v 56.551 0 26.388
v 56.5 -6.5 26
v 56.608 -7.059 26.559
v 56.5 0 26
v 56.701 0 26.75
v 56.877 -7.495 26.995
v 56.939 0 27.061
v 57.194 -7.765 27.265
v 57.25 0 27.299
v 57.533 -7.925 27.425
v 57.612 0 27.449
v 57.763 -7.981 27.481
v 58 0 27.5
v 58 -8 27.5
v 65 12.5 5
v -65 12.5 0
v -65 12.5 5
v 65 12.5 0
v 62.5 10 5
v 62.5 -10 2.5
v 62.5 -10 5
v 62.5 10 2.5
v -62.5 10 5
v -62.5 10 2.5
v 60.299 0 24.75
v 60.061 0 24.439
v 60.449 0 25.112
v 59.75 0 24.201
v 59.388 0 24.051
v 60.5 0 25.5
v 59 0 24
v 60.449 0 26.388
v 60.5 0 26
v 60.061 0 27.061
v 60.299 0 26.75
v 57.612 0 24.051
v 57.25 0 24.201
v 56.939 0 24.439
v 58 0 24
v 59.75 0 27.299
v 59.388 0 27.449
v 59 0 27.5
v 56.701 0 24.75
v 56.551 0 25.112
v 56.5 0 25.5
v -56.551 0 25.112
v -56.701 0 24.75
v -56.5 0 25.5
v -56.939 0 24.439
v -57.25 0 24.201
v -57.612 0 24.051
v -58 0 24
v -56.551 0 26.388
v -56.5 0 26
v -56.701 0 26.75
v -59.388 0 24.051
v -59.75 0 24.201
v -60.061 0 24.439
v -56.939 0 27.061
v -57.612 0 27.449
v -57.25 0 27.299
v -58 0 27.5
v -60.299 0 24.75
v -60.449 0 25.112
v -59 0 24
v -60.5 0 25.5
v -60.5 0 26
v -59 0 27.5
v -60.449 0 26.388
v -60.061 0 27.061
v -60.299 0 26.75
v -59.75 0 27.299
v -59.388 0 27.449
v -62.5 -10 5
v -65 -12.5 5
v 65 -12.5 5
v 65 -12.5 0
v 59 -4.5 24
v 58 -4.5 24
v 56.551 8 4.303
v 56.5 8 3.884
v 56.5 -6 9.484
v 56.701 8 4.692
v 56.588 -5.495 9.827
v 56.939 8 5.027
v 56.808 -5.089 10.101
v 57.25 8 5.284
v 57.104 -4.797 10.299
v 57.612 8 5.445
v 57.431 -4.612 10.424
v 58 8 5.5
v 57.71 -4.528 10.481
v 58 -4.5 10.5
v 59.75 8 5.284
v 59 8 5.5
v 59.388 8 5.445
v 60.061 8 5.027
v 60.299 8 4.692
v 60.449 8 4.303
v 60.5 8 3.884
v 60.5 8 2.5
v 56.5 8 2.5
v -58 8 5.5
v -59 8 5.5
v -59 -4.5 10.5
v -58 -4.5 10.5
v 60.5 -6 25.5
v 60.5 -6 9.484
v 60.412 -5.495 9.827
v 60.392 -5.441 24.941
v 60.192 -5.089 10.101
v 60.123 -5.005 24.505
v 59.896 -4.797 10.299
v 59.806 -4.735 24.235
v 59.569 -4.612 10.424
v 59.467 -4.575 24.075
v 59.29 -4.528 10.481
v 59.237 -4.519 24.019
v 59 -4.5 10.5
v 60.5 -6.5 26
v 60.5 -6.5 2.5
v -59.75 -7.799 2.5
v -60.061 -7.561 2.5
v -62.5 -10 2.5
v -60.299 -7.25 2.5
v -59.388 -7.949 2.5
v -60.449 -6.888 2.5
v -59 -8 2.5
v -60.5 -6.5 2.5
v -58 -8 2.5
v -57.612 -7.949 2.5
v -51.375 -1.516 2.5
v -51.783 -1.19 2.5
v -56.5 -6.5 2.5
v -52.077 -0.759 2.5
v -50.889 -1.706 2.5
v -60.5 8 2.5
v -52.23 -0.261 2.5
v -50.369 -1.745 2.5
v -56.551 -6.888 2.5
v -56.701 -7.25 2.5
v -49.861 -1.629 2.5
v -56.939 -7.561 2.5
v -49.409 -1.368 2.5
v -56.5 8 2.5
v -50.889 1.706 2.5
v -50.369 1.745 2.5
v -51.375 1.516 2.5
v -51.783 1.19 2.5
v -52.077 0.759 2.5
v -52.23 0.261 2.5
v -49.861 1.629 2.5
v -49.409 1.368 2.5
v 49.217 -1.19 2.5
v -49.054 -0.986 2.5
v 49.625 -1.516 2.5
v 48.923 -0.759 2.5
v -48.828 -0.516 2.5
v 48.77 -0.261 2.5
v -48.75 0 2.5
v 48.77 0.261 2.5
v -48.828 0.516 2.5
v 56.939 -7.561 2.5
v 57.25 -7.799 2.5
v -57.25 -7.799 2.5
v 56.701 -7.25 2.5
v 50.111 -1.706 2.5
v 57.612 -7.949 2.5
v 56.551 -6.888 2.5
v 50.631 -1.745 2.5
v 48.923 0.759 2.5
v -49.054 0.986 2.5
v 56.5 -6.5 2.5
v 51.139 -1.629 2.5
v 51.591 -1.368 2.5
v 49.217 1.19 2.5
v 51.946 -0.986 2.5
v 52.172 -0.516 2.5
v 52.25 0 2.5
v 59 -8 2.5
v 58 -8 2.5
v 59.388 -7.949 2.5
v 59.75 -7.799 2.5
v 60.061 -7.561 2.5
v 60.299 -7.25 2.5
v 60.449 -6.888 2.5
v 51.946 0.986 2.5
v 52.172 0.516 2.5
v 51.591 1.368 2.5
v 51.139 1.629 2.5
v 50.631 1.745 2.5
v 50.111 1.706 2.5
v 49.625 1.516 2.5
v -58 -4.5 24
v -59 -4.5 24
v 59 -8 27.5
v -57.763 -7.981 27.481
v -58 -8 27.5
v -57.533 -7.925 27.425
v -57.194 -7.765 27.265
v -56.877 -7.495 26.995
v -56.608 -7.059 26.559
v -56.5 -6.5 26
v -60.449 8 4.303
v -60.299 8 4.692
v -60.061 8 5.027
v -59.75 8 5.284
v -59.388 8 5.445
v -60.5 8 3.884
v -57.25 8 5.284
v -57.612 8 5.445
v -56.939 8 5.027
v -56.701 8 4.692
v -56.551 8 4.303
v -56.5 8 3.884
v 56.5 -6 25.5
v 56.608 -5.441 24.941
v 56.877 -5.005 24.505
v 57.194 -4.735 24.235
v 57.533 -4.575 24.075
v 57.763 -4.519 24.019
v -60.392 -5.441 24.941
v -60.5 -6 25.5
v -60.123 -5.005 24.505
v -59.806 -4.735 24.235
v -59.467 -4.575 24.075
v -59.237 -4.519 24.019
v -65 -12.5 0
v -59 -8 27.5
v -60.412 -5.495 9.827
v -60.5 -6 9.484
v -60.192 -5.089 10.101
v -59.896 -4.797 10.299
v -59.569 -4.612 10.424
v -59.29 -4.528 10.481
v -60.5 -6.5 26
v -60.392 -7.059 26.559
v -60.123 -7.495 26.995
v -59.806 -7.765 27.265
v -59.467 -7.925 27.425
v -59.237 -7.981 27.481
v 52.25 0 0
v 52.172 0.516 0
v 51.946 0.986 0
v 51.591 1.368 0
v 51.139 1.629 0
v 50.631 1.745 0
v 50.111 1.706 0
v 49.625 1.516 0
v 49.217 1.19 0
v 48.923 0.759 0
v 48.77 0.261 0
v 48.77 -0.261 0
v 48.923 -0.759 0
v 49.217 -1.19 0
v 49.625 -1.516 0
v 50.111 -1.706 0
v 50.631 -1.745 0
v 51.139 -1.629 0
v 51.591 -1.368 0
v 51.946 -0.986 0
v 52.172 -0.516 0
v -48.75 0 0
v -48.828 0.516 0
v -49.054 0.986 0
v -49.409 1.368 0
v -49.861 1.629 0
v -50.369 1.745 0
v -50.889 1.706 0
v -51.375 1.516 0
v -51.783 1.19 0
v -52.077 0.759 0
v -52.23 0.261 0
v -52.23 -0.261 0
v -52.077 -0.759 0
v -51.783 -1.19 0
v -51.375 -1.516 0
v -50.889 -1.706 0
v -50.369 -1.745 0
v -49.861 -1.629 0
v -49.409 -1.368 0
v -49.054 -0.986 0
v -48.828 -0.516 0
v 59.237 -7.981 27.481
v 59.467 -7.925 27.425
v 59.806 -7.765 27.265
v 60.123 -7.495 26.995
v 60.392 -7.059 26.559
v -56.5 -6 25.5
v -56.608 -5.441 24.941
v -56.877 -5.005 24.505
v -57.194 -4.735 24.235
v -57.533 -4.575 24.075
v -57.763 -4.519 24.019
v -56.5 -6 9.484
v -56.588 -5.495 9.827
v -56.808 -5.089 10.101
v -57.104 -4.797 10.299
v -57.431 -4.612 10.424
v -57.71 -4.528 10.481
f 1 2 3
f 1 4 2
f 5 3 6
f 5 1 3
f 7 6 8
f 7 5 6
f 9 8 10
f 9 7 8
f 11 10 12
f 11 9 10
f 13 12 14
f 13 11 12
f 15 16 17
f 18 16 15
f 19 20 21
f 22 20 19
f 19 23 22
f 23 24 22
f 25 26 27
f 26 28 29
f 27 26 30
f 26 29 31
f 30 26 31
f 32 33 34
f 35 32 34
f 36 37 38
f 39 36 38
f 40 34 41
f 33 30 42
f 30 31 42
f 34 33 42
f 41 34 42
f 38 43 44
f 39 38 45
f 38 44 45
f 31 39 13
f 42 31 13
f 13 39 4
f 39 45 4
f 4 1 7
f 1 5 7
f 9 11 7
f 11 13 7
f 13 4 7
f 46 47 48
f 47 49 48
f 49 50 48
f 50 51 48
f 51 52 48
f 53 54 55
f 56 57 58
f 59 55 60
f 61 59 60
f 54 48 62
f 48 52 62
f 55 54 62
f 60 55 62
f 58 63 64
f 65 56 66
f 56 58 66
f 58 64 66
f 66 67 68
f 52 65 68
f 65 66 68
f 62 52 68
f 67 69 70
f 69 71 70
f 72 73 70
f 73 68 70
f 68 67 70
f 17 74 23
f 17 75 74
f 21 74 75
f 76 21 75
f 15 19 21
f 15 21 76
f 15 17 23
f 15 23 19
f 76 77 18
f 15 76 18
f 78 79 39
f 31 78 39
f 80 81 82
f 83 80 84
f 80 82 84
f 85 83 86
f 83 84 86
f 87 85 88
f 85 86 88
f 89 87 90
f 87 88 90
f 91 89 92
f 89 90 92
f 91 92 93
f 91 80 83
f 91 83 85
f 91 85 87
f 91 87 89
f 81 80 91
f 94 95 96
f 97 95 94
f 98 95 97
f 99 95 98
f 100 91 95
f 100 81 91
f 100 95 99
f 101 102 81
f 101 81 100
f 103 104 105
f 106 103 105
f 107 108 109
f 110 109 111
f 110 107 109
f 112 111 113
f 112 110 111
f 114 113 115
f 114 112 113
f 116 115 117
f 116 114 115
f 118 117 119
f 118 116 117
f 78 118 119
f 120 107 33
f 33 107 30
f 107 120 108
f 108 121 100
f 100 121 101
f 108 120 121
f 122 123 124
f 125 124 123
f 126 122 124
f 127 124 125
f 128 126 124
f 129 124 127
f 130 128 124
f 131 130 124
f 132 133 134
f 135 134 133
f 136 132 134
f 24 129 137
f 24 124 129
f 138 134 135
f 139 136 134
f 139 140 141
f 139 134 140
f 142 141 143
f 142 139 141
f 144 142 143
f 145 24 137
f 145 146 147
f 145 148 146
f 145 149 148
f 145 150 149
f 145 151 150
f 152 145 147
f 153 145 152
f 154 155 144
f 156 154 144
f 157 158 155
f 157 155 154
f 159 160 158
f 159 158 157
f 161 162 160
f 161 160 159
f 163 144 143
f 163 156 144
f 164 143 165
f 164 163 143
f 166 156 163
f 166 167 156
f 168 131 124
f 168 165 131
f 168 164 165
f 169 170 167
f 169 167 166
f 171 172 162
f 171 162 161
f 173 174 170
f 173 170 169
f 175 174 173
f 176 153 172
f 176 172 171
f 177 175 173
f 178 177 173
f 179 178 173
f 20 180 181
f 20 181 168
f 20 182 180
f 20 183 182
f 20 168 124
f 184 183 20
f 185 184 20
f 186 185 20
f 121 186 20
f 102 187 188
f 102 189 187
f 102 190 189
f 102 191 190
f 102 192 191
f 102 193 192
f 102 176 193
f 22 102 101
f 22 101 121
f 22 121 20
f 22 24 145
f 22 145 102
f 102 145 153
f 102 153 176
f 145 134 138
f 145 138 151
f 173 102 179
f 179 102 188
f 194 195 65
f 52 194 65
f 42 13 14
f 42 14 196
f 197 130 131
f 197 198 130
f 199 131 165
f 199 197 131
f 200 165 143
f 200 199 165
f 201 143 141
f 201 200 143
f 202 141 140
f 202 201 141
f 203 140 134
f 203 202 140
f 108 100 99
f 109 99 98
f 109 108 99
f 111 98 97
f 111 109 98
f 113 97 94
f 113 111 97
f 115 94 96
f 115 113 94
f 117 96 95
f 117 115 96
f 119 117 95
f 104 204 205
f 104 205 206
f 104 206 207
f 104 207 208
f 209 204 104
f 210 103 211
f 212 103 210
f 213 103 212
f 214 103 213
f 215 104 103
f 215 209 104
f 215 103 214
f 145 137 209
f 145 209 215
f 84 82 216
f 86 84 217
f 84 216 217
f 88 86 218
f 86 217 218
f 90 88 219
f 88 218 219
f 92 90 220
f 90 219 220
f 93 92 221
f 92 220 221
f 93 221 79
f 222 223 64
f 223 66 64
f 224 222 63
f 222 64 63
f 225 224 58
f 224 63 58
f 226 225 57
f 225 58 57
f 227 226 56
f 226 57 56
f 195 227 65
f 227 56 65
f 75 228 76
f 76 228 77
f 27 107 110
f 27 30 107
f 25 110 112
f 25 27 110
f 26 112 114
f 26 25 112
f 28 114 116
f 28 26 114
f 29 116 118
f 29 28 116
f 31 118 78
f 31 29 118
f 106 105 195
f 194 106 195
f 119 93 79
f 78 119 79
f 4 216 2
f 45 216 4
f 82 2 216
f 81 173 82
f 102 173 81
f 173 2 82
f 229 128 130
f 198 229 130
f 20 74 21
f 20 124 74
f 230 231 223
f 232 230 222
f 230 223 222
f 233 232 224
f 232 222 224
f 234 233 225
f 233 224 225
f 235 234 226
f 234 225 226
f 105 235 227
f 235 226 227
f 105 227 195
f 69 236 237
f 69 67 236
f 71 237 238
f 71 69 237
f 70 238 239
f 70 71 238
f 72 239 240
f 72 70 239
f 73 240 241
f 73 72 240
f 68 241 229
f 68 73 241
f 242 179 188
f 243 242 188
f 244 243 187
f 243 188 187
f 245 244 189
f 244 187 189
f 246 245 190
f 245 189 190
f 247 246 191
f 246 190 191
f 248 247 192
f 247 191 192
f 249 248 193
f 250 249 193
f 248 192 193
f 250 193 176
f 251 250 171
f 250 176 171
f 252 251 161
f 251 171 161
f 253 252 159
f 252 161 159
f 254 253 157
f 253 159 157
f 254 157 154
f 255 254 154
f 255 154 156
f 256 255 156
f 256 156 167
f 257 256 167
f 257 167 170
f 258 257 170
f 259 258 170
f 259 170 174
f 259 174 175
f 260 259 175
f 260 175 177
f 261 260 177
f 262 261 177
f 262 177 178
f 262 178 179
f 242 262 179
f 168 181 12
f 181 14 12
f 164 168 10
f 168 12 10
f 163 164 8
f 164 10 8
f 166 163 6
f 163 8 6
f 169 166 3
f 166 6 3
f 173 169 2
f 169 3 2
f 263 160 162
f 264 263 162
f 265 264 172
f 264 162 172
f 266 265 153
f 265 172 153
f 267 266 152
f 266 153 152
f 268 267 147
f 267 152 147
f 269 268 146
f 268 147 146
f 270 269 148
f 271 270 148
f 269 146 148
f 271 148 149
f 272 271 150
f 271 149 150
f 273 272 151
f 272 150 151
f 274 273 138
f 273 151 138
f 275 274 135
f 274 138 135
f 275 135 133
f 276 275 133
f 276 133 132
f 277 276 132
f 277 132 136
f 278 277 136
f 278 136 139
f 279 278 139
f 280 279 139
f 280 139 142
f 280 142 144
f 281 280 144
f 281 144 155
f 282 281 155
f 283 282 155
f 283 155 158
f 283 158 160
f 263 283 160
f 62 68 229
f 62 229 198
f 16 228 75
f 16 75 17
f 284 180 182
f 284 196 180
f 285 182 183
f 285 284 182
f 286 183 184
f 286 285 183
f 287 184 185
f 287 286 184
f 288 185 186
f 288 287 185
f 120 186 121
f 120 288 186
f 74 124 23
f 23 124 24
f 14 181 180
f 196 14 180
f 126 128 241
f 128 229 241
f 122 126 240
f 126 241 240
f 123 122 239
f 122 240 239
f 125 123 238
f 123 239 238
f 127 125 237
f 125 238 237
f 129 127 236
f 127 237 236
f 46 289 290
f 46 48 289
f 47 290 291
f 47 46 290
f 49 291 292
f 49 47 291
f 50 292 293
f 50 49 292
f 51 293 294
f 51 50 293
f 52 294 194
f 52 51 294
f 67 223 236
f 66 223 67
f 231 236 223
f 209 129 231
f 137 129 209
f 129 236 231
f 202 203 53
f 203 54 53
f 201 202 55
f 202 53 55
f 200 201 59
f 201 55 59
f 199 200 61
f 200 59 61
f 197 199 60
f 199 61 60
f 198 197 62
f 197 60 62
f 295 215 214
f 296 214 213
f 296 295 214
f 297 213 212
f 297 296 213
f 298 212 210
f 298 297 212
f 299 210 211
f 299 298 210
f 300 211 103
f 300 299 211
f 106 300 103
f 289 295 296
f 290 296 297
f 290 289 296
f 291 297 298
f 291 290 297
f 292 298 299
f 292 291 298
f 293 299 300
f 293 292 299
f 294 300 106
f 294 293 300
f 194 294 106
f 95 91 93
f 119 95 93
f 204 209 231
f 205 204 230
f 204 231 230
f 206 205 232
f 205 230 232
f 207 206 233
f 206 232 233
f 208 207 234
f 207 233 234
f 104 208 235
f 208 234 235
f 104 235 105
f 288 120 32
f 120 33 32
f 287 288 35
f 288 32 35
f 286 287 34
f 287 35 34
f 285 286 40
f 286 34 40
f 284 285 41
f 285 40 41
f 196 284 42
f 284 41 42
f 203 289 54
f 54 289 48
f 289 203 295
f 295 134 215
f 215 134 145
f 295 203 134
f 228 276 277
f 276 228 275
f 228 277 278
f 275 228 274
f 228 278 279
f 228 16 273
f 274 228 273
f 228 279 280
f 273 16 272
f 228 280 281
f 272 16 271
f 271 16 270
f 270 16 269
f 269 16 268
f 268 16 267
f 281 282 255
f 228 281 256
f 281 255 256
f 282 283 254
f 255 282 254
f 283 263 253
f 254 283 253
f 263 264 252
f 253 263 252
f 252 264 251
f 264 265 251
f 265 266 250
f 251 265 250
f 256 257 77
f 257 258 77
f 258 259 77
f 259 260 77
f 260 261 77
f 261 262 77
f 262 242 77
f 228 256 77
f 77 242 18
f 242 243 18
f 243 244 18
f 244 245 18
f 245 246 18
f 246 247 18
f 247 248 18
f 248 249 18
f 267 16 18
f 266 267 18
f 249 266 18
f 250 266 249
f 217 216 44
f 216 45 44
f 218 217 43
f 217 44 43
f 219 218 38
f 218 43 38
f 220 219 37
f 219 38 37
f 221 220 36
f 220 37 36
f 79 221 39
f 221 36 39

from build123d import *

# Parameters (mm, degrees)
F0_W      = 130
F0_H      = 25
F1_DEPTH  = 5
F2_T      = -2.5
F3_W      = 4
F3_H      = 16
F4_DEPTH  = 25
F6_DEPTH  = 125.501
F7_R      = 1.5
F8_R      = 1.5
F9_R      = 1.75
F10_DEPTH = 2.501


with BuildPart() as f1:
    # F0 (on Top) → F1 (new body)
    with BuildSketch(Plane.XY):
        Rectangle(F0_W, F0_H)
    extrude(amount=F1_DEPTH)

    # F2
    f2_openings = [f1.faces().sort_by_distance(p)[0] for p in [
        (0, 0, 5),
    ]]
    offset(amount=F2_T, openings=f2_openings)

    # F3 (on face) → F4 (join)
    with BuildSketch(Plane.XY.offset(2.5)):
        with Locations((-58.5, 0)):
            Rectangle(F3_W, F3_H)
        with Locations((58.5, 0)):
            Rectangle(F3_W, F3_H)
    extrude(amount=F4_DEPTH)

    # F5 (on face) → F6 (cut, through all)
    with BuildSketch(Plane(origin=(-60.5, 0, 0), x_dir=(0, -1, 0), z_dir=(-1, 0, 0))):
        Polygon((0, 24), (0, 27.5), (-8, 27.5), (-8, 5.5), (4.5, 10.5), (4.5, 24), align=None)
    extrude(amount=-F6_DEPTH, mode=Mode.SUBTRACT)

    # F7
    f7_edges = [f1.edges().sort_by_distance(p)[0] for p in [
        (-60.5, -2.25, 24),
        (-60.5, -4, 27.5),
        (-56.5, -4, 27.5),
        (-56.5, -2.25, 24),
        (-60.5, -4.5, 17.25),
        (-56.5, -4.5, 17.25),
        (-60.5, -8, 15),
        (-56.5, -8, 15),
        (-60.5, 1.75, 8),
        (-56.5, 1.75, 8),
    ]]
    fillet(f7_edges, radius=F7_R)

    # F8
    f8_edges = [f1.edges().sort_by_distance(p)[0] for p in [
        (60.5, -4, 27.5),
        (56.5, -4, 27.5),
        (60.5, -2.25, 24),
        (60.5, -4.5, 17.25),
        (60.5, -8, 15),
        (60.5, 1.75, 8),
        (56.5, -8, 15),
        (56.5, -4.5, 17.25),
        (56.5, -2.25, 24),
        (56.5, 1.75, 8),
    ]]
    fillet(f8_edges, radius=F8_R)

    # F9 (on face) → F10 (cut, through all)
    with BuildSketch(Plane.XY.offset(2.5)):
        with Locations((-50.5, 0)):
            Circle(F9_R)
        with Locations((50.5, 0)):
            Circle(F9_R)
    extrude(amount=-F10_DEPTH, mode=Mode.SUBTRACT)


solid = f1.part
